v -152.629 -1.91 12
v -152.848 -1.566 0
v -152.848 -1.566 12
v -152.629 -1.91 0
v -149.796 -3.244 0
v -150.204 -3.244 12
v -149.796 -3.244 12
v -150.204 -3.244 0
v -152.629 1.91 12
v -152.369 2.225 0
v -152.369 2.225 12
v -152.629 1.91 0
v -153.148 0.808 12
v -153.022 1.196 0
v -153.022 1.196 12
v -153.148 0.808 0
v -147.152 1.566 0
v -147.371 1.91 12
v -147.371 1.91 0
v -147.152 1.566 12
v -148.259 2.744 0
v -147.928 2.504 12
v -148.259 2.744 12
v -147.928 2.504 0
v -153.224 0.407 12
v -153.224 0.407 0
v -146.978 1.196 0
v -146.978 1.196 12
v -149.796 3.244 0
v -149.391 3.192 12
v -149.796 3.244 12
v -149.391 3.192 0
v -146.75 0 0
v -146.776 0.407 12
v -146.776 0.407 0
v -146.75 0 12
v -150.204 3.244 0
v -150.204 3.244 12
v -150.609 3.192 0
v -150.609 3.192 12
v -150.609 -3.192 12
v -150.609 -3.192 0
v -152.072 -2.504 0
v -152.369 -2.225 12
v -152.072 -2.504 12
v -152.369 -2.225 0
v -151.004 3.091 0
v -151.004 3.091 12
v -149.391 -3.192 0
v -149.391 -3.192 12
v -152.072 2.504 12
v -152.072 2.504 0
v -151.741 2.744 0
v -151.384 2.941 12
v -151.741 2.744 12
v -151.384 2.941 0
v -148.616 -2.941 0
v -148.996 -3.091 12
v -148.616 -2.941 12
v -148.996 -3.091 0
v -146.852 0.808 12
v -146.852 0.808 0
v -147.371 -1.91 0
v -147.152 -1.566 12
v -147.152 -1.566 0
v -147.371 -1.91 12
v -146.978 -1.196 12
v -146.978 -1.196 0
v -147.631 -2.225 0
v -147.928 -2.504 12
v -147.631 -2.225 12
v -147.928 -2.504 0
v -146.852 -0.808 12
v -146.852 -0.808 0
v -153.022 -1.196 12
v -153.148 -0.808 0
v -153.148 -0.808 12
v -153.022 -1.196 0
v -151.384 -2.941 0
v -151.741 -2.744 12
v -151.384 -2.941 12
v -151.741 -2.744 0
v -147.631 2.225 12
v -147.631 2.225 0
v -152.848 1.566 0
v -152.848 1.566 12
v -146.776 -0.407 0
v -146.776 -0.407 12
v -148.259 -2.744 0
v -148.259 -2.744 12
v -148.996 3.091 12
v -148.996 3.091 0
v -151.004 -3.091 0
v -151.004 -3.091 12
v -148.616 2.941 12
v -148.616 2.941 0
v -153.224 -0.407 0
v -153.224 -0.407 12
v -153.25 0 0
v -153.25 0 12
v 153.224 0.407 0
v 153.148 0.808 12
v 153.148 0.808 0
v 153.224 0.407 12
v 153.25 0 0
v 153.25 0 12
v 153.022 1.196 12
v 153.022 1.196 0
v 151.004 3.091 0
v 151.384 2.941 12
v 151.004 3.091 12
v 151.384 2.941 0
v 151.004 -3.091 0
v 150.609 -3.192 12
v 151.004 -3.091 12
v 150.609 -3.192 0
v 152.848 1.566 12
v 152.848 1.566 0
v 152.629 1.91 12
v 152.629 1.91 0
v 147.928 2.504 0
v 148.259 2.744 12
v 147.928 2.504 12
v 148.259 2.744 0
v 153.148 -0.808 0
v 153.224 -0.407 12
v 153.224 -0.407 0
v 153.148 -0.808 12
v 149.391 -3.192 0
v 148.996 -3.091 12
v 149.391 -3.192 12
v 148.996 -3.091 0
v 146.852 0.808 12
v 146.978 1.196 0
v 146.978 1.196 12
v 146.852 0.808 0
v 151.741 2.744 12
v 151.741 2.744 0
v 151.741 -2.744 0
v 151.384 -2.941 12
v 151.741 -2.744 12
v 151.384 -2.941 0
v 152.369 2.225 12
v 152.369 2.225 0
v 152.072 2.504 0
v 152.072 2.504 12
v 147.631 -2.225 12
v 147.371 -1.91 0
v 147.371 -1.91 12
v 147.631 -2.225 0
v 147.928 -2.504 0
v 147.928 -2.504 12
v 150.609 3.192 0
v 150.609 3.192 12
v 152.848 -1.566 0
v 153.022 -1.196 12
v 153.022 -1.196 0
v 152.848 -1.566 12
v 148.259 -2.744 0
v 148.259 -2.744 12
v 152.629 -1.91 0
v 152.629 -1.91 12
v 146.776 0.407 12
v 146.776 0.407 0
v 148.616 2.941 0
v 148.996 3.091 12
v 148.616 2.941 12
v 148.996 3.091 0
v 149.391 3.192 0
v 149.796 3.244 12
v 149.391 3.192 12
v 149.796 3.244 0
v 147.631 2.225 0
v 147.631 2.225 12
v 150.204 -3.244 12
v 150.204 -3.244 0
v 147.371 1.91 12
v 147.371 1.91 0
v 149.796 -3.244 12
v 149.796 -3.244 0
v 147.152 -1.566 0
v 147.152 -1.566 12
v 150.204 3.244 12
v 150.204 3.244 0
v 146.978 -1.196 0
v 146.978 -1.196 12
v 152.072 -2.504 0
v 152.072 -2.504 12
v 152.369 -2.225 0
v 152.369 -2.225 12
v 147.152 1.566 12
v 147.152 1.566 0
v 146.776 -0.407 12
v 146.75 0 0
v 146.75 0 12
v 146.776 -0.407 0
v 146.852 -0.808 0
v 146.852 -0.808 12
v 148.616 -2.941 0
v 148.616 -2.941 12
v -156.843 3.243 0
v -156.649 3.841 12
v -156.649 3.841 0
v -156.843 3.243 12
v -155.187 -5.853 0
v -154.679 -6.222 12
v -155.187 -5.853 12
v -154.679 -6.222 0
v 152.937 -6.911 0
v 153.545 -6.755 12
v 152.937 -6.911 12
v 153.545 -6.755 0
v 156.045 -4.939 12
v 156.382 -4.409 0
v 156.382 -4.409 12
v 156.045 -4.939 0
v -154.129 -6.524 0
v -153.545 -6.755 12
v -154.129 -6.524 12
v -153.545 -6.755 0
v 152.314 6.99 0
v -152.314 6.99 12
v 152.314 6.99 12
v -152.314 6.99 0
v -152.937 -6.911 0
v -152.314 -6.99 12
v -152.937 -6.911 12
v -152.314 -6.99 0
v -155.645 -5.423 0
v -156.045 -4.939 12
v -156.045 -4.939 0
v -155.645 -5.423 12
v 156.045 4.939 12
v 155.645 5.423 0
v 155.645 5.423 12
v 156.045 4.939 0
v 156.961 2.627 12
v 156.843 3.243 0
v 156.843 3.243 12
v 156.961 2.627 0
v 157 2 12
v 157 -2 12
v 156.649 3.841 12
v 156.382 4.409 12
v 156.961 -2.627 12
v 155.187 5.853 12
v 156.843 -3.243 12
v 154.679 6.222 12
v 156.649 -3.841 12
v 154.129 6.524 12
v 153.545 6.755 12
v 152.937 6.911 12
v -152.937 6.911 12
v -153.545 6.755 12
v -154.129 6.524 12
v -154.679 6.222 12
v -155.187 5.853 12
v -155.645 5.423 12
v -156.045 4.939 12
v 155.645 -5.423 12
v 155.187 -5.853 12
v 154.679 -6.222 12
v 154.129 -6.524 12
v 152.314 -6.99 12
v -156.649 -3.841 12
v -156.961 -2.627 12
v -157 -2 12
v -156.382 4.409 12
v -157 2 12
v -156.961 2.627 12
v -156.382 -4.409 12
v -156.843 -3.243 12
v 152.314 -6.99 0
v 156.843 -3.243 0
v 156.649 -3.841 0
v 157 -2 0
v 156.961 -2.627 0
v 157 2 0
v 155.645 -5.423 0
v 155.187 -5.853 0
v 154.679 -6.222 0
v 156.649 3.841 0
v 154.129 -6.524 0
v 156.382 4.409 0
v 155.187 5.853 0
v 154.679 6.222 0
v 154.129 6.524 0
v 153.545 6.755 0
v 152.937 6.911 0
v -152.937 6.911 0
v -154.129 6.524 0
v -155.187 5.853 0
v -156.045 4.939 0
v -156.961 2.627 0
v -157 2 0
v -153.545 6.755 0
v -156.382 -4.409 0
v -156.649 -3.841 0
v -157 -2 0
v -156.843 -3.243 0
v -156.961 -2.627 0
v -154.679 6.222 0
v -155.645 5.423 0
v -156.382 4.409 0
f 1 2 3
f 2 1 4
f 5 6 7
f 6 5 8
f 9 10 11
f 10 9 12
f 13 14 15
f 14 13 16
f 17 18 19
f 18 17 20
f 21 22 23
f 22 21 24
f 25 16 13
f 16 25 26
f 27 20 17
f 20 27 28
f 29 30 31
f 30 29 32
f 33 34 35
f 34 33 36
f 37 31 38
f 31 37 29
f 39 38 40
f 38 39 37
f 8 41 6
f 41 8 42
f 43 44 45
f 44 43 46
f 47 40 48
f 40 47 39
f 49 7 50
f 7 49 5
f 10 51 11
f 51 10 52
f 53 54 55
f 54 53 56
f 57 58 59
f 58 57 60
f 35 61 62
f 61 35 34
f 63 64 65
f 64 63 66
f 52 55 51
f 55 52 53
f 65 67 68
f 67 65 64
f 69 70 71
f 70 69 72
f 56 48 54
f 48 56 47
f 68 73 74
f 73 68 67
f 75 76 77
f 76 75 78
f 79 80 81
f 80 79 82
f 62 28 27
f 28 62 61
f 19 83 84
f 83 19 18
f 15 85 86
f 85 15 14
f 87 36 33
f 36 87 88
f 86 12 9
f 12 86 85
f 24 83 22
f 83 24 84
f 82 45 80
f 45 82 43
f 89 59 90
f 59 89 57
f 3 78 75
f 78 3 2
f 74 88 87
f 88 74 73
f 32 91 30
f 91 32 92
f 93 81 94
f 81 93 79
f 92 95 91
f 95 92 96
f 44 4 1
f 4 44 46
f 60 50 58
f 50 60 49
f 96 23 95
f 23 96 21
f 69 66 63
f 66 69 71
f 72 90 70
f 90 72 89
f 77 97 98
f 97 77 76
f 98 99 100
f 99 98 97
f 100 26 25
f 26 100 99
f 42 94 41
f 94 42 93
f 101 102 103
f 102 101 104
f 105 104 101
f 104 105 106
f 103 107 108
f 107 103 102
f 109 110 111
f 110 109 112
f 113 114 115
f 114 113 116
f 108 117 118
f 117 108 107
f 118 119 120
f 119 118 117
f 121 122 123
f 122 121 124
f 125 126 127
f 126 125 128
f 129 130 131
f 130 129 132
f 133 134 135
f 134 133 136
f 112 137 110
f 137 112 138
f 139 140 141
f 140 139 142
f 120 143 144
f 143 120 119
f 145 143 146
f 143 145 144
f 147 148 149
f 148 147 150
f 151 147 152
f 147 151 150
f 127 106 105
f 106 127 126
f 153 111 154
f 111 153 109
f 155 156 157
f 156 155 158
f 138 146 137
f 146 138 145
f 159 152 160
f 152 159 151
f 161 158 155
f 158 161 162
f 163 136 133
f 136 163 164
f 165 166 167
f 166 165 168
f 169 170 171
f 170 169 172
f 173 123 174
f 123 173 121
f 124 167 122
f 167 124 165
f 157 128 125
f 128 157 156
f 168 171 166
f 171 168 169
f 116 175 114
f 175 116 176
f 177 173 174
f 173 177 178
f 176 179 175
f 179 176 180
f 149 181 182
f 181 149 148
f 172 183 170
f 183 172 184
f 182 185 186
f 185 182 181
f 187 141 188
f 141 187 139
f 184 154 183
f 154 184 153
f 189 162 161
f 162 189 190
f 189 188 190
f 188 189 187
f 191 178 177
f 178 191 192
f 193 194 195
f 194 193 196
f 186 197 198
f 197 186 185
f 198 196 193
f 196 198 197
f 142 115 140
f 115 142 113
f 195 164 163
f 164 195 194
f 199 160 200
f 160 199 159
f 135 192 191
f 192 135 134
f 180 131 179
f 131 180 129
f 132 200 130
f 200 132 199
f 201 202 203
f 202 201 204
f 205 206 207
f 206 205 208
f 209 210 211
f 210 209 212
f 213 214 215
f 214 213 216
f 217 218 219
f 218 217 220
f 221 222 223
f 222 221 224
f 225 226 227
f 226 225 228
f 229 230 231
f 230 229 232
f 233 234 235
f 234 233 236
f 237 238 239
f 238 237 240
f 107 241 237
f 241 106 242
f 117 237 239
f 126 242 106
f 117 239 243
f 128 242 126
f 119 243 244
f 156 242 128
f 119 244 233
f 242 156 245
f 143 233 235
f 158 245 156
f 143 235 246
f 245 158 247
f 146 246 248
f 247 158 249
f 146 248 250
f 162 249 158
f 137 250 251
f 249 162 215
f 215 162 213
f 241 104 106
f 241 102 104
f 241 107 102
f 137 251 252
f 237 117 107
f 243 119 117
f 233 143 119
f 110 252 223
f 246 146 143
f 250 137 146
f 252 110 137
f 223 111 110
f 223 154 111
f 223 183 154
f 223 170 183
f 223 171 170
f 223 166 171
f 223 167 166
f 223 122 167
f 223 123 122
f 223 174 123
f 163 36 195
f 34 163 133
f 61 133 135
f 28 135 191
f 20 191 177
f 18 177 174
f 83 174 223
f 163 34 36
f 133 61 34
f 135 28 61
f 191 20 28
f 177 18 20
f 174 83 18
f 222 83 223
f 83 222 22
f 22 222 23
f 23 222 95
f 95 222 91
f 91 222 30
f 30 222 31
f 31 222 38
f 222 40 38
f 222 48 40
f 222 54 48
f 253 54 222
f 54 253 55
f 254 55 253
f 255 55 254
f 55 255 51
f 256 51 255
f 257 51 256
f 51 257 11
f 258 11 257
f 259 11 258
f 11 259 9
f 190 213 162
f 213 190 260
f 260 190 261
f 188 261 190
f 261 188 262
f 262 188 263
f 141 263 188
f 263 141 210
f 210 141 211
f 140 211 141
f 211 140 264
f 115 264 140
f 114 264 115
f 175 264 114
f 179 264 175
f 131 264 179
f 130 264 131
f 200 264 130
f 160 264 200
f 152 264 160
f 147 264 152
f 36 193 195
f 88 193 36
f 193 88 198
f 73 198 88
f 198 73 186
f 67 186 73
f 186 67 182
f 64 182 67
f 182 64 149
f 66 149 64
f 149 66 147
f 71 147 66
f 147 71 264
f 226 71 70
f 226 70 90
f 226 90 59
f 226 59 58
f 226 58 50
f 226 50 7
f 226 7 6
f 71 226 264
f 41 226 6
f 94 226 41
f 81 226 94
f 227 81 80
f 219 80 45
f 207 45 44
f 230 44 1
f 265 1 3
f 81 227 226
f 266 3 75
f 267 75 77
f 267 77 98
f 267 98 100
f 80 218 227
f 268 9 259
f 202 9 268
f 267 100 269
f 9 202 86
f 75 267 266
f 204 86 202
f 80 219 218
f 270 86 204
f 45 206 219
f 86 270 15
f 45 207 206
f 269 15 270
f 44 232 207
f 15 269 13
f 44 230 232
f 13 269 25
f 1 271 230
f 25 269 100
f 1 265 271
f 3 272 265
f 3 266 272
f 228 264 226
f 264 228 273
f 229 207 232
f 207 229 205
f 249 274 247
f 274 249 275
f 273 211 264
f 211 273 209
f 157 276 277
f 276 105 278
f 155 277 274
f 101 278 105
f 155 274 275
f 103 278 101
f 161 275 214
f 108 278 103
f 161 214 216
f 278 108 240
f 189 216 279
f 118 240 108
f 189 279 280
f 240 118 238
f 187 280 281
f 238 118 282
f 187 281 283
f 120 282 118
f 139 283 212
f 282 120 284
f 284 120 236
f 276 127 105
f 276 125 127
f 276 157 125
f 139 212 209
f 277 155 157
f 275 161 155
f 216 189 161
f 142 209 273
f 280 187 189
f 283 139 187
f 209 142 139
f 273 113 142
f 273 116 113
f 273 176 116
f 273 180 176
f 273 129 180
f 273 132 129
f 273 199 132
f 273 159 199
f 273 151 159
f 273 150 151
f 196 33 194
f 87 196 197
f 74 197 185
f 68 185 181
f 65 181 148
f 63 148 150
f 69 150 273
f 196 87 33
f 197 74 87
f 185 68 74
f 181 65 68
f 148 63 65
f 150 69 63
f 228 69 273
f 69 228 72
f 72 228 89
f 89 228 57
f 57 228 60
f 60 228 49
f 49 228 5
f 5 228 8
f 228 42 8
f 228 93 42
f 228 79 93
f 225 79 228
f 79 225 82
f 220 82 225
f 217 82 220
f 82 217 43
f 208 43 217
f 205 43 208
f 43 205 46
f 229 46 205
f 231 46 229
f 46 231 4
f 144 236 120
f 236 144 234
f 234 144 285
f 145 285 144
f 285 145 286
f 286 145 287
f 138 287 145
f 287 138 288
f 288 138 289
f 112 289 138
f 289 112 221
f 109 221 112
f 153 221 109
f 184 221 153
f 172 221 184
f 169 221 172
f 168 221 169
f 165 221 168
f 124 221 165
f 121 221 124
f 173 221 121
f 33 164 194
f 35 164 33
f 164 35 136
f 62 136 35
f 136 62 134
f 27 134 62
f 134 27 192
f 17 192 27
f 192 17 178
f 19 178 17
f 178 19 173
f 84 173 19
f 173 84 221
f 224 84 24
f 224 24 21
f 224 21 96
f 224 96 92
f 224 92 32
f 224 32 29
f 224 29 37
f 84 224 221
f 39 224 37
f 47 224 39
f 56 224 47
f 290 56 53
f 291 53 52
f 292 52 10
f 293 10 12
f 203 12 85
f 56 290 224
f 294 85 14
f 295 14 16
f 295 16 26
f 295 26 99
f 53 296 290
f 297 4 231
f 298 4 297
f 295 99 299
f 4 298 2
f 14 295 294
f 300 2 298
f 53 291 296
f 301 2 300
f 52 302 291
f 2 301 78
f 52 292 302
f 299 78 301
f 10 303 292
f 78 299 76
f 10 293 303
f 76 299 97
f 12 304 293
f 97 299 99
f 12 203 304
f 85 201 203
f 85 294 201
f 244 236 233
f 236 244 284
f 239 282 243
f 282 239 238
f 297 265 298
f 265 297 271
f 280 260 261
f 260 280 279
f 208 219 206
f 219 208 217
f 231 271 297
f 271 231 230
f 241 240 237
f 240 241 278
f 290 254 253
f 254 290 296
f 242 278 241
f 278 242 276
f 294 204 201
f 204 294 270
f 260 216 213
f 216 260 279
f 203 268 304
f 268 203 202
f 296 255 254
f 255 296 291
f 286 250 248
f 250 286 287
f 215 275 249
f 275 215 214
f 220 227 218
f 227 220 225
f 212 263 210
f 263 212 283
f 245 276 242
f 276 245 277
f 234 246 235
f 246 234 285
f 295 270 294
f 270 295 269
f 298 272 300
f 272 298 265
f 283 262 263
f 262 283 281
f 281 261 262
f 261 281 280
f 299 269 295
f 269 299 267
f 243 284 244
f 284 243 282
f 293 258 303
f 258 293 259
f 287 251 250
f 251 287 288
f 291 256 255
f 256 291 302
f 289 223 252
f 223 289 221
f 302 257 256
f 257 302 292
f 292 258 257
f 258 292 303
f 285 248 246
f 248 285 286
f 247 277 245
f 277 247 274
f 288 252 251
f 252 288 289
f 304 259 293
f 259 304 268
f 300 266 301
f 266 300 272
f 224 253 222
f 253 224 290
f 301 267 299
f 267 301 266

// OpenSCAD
$fn = 50;


difference() {
	union() {
		hull() {
			translate(v = [-152.0000000000, 2.0000000000, 0]) {
				cylinder(h = 12, r = 5);
			}
			translate(v = [152.0000000000, 2.0000000000, 0]) {
				cylinder(h = 12, r = 5);
			}
			translate(v = [-152.0000000000, -2.0000000000, 0]) {
				cylinder(h = 12, r = 5);
			}
			translate(v = [152.0000000000, -2.0000000000, 0]) {
				cylinder(h = 12, r = 5);
			}
		}
	}
	union() {
		translate(v = [-150.0000000000, 0.0000000000, -100.0000000000]) {
			cylinder(h = 200, r = 3.2500000000);
		}
		translate(v = [-150.0000000000, 0.0000000000, -100.0000000000]) {
			cylinder(h = 200, r = 3.2500000000);
		}
		translate(v = [150.0000000000, 0.0000000000, -100.0000000000]) {
			cylinder(h = 200, r = 3.2500000000);
		}
		translate(v = [150.0000000000, 0.0000000000, -100.0000000000]) {
			cylinder(h = 200, r = 3.2500000000);
		}
	}
}
